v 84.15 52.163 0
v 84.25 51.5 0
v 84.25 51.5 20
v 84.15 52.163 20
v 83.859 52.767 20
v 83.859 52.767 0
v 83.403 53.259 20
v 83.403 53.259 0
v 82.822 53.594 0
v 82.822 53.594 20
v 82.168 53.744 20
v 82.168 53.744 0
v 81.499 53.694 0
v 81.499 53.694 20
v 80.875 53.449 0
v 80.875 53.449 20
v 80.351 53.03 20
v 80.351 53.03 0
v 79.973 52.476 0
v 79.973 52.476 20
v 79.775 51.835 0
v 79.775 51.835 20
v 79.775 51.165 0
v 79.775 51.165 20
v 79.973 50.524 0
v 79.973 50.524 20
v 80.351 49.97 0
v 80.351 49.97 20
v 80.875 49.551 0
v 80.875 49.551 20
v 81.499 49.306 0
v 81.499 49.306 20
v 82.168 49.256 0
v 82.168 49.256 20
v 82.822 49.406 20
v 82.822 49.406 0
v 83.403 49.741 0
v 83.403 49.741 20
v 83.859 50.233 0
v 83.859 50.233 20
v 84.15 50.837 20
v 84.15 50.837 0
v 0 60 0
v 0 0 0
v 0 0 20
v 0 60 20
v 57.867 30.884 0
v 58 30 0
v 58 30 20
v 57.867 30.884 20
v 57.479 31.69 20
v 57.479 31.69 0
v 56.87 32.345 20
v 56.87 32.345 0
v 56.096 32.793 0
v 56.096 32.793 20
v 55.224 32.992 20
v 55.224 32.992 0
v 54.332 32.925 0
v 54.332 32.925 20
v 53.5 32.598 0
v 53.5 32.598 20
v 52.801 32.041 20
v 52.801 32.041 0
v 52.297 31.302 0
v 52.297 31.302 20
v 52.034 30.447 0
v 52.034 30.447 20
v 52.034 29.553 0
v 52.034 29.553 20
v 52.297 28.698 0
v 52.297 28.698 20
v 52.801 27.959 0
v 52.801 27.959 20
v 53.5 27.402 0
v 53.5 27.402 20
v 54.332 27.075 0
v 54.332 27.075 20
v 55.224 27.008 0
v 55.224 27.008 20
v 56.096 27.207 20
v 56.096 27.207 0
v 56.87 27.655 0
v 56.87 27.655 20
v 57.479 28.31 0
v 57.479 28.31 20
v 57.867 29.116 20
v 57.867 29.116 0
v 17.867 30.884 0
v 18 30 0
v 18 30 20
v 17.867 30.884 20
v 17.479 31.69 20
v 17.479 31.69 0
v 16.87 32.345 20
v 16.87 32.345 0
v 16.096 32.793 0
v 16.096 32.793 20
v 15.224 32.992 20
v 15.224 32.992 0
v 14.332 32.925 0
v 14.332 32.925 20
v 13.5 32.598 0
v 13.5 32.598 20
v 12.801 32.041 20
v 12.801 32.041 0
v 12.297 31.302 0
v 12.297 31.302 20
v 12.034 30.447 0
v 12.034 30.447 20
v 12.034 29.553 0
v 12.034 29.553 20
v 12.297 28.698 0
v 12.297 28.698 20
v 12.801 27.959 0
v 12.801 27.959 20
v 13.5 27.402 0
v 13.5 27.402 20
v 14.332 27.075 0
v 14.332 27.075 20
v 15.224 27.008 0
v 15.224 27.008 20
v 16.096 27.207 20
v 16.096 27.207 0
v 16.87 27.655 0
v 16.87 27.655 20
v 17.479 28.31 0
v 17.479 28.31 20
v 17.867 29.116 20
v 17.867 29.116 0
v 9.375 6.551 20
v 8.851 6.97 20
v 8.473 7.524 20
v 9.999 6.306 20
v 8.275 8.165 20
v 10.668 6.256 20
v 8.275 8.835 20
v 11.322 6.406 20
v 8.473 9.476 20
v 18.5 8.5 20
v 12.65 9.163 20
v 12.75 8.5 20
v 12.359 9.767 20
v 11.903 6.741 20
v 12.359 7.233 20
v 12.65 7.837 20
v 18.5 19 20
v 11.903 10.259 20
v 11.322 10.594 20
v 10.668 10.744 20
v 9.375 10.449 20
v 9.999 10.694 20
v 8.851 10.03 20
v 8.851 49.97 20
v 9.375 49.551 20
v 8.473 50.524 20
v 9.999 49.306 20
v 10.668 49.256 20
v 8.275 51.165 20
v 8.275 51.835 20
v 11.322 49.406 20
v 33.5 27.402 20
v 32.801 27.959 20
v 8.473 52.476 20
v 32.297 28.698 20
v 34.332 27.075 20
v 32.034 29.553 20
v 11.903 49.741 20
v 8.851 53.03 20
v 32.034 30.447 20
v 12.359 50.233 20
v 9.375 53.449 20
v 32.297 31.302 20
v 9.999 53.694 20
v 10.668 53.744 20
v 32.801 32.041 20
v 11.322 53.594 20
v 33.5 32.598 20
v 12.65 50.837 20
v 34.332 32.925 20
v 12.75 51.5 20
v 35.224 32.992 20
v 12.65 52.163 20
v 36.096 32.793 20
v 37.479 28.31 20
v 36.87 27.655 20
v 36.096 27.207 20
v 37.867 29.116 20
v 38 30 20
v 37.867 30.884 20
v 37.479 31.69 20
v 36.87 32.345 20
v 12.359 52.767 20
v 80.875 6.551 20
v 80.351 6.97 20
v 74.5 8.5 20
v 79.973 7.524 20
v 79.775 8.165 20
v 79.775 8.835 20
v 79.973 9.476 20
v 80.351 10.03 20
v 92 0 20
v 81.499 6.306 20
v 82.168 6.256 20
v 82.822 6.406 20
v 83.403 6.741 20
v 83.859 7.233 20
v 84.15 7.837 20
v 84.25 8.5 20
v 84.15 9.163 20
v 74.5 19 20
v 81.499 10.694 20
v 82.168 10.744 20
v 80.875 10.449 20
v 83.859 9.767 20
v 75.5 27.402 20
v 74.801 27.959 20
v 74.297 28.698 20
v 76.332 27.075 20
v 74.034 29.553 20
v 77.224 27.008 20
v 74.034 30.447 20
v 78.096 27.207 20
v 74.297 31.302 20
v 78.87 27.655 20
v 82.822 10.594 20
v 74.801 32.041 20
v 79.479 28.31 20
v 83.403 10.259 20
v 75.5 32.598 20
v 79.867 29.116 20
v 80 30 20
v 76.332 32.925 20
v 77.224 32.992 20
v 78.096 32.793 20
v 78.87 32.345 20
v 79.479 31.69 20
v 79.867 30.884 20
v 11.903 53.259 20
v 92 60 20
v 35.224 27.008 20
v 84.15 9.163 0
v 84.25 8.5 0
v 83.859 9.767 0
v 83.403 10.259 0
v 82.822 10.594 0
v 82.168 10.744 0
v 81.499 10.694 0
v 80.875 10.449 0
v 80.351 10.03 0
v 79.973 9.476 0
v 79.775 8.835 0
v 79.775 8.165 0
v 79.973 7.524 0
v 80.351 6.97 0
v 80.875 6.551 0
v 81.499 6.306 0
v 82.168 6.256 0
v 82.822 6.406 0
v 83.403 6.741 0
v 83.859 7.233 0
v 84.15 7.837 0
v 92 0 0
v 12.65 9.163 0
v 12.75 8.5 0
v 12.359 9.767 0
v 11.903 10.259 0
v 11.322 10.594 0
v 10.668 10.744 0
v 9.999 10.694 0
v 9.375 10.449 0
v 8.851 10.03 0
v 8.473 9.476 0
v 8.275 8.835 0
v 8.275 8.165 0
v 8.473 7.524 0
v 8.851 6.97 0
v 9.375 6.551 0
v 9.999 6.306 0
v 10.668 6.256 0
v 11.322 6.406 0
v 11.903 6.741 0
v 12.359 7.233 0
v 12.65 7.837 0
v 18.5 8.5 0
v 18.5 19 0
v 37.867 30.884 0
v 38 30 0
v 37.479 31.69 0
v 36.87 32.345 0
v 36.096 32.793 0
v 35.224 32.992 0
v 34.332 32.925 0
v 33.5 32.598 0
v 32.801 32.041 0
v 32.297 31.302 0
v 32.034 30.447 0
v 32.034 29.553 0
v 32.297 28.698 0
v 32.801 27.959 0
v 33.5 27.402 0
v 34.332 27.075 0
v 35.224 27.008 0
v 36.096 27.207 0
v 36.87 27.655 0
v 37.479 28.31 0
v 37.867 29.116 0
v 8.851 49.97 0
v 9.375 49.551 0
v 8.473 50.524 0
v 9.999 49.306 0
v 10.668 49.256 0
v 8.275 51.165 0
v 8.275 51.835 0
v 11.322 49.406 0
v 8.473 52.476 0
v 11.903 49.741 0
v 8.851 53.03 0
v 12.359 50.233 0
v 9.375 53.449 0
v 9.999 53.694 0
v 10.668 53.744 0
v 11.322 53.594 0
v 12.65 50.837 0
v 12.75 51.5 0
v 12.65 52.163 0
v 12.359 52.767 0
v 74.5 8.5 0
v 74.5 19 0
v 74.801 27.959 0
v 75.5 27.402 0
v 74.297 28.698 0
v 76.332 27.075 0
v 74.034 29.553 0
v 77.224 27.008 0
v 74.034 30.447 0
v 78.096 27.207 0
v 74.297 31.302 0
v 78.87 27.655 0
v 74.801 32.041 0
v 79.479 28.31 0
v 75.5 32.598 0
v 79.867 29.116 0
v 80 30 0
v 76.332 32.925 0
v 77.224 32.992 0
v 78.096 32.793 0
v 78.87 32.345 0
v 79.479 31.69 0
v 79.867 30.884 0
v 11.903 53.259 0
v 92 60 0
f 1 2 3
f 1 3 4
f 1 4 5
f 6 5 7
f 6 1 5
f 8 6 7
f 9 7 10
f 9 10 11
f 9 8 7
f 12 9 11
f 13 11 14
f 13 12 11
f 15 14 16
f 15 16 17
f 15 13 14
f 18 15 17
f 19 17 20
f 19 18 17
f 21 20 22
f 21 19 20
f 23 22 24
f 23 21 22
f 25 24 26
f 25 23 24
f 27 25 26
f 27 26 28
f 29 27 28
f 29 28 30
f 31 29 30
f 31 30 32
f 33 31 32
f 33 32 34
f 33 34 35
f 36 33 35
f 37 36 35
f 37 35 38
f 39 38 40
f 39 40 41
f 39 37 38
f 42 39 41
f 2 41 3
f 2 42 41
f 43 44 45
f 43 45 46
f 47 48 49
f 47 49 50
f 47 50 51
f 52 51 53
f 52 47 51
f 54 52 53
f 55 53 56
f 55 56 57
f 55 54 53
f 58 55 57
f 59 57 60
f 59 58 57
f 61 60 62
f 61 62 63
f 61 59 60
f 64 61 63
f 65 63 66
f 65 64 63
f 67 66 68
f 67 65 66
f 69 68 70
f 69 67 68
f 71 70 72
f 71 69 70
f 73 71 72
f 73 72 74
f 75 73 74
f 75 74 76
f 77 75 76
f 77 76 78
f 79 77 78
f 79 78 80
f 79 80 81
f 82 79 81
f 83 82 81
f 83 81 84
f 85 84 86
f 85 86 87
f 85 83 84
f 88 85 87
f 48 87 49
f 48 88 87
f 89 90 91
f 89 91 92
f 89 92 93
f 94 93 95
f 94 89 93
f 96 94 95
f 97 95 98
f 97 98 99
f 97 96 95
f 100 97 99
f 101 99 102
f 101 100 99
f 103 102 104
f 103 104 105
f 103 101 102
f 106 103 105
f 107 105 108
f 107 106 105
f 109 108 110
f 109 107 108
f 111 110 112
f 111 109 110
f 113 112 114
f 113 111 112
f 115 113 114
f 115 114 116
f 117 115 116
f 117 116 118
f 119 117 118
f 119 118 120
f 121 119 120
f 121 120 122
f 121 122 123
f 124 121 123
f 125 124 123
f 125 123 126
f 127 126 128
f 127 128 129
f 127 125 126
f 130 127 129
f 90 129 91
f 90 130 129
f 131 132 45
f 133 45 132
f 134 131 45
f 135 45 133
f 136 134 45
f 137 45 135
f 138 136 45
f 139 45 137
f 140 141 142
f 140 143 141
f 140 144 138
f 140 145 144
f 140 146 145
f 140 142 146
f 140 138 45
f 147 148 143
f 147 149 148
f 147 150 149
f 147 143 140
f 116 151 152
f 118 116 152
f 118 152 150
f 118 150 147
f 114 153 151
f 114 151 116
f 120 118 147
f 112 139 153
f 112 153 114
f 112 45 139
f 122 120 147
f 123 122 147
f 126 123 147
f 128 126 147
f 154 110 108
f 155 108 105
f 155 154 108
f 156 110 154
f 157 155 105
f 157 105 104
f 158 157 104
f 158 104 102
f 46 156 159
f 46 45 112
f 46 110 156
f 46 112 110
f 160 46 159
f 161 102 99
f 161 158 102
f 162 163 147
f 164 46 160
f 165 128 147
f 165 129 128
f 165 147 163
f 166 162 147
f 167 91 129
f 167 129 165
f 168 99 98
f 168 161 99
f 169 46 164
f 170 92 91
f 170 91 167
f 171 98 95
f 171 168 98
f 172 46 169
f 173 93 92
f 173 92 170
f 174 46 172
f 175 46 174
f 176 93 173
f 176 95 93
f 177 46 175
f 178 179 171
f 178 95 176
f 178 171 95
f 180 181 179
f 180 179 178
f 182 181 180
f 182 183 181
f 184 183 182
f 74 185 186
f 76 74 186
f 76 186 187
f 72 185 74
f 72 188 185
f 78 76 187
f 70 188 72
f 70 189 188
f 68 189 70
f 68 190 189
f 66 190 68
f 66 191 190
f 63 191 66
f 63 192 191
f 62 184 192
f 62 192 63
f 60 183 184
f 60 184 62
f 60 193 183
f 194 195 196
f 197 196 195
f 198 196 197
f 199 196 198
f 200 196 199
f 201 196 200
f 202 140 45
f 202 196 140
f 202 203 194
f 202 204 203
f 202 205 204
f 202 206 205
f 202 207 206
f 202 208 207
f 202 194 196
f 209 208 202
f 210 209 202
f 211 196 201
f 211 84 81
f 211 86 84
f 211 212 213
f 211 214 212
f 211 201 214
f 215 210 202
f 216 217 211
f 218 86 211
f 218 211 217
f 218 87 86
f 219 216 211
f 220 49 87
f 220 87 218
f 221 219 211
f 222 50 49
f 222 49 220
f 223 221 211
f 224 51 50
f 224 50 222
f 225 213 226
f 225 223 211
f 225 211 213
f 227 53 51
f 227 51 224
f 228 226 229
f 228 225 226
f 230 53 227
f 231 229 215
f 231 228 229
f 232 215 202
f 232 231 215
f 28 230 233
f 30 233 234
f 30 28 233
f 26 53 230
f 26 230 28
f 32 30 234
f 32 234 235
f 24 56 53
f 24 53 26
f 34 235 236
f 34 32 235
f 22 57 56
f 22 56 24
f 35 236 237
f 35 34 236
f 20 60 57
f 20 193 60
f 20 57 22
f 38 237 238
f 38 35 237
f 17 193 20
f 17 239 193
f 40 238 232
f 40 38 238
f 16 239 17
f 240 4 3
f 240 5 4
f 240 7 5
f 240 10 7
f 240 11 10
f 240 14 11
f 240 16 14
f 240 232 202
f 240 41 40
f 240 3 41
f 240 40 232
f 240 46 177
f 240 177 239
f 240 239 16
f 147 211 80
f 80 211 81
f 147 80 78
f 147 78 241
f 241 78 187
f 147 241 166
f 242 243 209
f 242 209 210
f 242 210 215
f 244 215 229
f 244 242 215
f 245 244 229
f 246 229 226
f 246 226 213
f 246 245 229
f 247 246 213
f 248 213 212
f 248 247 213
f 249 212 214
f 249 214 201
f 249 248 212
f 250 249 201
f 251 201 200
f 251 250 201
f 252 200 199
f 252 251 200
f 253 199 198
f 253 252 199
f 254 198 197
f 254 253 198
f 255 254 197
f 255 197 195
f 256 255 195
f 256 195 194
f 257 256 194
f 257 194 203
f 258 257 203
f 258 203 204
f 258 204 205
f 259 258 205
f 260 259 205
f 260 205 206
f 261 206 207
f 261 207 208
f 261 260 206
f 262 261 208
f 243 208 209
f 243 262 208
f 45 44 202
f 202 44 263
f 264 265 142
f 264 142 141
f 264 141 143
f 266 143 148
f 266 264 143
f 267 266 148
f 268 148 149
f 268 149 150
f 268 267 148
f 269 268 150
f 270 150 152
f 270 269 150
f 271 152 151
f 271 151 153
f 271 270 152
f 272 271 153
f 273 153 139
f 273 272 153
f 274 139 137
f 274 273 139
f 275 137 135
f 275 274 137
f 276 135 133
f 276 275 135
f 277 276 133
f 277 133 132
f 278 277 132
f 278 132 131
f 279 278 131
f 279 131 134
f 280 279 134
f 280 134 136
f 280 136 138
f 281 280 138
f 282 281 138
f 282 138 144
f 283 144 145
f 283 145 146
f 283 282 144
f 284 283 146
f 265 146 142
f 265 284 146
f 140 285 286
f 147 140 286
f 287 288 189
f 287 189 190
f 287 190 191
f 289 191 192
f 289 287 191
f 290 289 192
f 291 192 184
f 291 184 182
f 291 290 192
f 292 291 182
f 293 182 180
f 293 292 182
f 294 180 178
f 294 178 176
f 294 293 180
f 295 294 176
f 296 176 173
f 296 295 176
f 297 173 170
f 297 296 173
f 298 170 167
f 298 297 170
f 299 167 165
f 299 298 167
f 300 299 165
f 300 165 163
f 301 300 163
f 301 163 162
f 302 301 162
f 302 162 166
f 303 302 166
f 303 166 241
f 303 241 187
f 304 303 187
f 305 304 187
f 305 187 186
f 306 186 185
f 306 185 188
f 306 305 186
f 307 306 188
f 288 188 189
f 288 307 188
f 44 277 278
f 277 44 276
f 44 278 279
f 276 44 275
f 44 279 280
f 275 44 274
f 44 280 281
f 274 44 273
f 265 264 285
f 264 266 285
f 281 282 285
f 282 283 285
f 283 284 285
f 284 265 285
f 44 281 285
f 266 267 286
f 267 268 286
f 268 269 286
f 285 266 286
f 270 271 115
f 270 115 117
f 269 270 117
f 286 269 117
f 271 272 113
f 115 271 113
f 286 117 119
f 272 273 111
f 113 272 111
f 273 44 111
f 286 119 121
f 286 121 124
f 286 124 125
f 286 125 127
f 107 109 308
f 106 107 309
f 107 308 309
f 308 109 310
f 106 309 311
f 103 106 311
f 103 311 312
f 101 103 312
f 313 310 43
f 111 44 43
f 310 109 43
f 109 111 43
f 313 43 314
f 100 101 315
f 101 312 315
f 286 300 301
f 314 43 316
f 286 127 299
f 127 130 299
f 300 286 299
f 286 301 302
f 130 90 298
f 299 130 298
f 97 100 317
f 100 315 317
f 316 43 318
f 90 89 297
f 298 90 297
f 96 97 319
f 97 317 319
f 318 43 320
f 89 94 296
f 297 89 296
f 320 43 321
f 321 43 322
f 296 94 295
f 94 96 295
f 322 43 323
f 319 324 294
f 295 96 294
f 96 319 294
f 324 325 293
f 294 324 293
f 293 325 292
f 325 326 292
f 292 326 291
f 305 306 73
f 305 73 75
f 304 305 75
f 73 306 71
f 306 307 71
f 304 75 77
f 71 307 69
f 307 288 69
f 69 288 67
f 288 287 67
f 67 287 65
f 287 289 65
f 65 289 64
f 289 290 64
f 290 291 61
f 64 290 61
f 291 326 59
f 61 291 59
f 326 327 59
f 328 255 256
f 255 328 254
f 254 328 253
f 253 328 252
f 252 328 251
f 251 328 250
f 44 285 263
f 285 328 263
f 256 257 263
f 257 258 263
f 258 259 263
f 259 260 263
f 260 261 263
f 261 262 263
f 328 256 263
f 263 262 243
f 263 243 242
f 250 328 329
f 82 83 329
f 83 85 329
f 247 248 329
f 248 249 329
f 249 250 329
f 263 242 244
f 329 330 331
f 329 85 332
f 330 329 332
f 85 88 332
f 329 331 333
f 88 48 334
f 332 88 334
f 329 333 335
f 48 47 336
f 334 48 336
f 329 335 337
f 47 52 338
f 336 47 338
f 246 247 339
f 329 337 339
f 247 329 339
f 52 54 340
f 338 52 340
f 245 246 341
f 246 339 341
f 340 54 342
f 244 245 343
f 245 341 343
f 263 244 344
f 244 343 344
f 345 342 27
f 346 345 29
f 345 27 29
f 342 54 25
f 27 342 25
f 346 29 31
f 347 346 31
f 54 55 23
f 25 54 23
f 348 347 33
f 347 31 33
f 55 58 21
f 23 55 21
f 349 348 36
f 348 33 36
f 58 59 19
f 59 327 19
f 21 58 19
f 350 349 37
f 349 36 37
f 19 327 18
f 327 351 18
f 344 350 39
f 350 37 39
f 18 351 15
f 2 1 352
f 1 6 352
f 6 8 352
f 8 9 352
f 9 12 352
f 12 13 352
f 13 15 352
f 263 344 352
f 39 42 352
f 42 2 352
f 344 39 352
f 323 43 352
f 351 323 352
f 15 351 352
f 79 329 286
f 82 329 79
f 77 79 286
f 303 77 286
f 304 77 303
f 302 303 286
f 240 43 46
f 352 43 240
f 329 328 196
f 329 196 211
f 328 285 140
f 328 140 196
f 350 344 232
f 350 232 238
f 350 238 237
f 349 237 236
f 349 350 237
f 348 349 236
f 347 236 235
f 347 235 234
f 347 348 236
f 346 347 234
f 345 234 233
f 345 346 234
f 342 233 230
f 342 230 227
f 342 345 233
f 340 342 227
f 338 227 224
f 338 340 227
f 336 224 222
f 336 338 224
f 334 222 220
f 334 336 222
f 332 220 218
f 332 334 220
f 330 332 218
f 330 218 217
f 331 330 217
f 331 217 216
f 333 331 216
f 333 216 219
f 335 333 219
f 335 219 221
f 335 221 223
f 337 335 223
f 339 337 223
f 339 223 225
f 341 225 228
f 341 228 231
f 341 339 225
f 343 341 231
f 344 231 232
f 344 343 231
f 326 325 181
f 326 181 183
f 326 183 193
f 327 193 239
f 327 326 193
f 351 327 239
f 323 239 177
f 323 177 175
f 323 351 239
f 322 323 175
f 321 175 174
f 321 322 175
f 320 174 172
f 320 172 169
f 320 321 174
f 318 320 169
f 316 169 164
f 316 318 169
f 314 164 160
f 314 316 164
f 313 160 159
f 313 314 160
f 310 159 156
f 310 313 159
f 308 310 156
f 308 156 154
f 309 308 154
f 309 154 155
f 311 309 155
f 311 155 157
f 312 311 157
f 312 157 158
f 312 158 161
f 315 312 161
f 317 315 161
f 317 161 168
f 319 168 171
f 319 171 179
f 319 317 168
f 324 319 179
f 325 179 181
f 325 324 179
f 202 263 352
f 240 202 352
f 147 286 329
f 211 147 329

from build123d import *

# Parameters (mm, degrees)
SKETCH3_W           = 92
SKETCH3_H           = 60
SKETCH3_W_2         = 76.5
SKETCH3_H_2         = 48
SKETCH3_R           = 2.25
SKETCH3_R_2         = 3
SKETCH3_W_3         = 56
SKETCH3_H_3         = 10.5
BOSS_EXTRUDE3_DEPTH = 20


with BuildPart() as part:
    # Sketch3 → Boss-Extrude3 (new body)
    # profile 1 of 2: a face of its own
    with BuildSketch(Plane.XY):
        with Locations((46, 30)):
            Rectangle(SKETCH3_W, SKETCH3_H)
        with Locations((46.25, 30)):
            Rectangle(SKETCH3_W_2, SKETCH3_H_2, mode=Mode.SUBTRACT)
    # profile 2 of 2: a face of its own
    with BuildSketch(Plane.XY):
        with Locations((46.25, 30)):
            Rectangle(SKETCH3_W_2, SKETCH3_H_2)
        with Locations((10.5, 51.5)):
            Circle(SKETCH3_R, mode=Mode.SUBTRACT)
        with Locations((10.5, 8.5)):
            Circle(SKETCH3_R, mode=Mode.SUBTRACT)
        with Locations((82, 8.5)):
            Circle(SKETCH3_R, mode=Mode.SUBTRACT)
        with Locations((82, 51.5)):
            Circle(SKETCH3_R, mode=Mode.SUBTRACT)
        with Locations((77, 30)):
            Circle(SKETCH3_R_2, mode=Mode.SUBTRACT)
        with Locations((55, 30)):
            Circle(SKETCH3_R_2, mode=Mode.SUBTRACT)
        with Locations((35, 30)):
            Circle(SKETCH3_R_2, mode=Mode.SUBTRACT)
        with Locations((15, 30)):
            Circle(SKETCH3_R_2, mode=Mode.SUBTRACT)
        with Locations((46.5, 13.75)):
            Rectangle(SKETCH3_W_3, SKETCH3_H_3, mode=Mode.SUBTRACT)
    extrude(amount=BOSS_EXTRUDE3_DEPTH)


solid = part.part
